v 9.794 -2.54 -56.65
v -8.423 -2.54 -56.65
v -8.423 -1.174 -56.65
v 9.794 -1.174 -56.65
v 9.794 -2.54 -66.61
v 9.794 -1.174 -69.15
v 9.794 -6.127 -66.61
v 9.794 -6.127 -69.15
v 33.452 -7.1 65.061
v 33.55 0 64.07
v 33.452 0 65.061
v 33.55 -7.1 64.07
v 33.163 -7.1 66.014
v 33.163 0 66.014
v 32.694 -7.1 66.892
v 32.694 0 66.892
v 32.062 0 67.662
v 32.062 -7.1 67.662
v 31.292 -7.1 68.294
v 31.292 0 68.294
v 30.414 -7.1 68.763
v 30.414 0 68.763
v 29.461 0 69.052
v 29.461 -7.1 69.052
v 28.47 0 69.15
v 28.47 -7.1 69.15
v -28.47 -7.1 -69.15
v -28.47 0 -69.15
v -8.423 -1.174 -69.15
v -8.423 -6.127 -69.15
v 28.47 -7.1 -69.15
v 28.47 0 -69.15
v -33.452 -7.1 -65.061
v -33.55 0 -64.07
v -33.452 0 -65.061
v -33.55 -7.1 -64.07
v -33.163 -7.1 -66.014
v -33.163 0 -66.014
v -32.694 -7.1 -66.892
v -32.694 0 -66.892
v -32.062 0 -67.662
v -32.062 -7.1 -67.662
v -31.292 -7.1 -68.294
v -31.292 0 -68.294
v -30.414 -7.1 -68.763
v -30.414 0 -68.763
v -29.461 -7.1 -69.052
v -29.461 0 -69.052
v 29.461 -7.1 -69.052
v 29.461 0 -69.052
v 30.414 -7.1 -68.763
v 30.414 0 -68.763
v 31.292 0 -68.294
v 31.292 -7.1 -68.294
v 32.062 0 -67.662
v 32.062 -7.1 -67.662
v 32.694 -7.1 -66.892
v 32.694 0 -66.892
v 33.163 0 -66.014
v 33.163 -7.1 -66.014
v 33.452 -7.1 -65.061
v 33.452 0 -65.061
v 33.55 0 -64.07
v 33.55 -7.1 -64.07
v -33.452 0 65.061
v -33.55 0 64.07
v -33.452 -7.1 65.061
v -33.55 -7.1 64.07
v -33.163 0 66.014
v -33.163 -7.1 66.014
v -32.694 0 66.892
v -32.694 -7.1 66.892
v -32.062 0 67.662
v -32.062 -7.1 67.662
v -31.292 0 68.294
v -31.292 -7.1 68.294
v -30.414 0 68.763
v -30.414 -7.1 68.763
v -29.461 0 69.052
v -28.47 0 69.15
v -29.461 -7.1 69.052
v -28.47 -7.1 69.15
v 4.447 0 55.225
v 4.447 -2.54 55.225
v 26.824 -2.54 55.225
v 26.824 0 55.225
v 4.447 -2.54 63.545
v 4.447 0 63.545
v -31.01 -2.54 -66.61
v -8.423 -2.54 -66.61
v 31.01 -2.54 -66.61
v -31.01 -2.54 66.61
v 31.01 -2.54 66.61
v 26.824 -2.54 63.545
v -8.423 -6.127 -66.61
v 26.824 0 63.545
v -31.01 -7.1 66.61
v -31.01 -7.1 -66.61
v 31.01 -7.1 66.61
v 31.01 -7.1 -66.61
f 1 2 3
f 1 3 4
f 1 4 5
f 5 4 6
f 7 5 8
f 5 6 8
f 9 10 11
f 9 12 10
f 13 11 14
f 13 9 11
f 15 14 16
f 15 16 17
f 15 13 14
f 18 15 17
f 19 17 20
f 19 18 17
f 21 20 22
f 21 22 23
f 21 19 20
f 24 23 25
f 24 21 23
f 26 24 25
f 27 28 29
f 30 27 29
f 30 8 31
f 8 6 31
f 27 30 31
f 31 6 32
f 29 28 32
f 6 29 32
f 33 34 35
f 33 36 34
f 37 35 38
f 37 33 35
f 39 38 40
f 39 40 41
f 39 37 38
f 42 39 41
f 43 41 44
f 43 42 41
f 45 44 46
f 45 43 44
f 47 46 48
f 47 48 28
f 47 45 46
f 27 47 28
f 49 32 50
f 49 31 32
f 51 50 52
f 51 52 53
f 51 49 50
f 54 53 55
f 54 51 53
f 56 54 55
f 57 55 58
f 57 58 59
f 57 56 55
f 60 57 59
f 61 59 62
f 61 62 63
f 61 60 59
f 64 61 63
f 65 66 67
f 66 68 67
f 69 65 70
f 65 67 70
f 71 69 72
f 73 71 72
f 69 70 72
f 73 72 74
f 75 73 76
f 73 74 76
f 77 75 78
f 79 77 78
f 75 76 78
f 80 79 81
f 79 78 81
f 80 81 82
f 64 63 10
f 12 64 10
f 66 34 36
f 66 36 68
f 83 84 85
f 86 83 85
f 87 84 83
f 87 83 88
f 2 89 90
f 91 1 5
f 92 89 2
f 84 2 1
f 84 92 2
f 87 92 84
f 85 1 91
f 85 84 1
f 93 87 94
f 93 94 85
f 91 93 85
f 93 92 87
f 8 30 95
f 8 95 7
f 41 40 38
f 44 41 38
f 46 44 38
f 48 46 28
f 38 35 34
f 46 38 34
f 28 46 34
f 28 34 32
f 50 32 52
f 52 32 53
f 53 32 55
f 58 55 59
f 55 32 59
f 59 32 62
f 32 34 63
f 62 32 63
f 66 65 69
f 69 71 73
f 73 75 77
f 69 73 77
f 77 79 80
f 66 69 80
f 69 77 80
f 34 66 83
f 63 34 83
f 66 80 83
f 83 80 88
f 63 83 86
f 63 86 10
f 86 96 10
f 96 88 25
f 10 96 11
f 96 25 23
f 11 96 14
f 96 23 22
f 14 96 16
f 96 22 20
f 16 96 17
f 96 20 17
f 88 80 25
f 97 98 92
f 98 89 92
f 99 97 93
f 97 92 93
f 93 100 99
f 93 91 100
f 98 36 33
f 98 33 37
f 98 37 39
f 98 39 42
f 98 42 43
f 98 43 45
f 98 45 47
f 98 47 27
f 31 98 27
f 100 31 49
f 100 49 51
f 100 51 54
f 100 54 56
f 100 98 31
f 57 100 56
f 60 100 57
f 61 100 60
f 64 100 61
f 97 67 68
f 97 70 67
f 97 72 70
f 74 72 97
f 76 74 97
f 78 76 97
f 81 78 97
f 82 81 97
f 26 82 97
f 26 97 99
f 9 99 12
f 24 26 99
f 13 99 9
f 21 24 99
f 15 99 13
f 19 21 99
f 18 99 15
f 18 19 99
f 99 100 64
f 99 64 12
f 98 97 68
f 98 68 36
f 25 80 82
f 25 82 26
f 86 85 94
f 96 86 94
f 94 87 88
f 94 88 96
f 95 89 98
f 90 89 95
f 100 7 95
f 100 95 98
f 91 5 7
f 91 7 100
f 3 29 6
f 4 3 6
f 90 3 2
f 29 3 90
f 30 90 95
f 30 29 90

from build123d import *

# Parameters (mm, degrees)
F0_W     = 67.1
F0_H     = 138.3
F1_DEPTH = 7.1
F2_T     = -2.54
F3_R     = 5.08
F5_W     = 18.216582
F5_H     = 4.952895
F6_DEPTH = 12.5
F4_W     = 22.377047
F4_H     = 8.319672
F7_DEPTH = 12.5


with BuildPart() as f1:
    # F0 (on Front) → F1 (new body)
    with BuildSketch(Plane.XZ):
        Rectangle(F0_W, F0_H)
    extrude(amount=F1_DEPTH)

    # F2
    f2_openings = [f1.faces().sort_by_distance(p)[0] for p in [
        (0, -7.1, 0),
    ]]
    offset(amount=F2_T, openings=f2_openings)

    # F3
    f3_edges = [f1.edges().sort_by_distance(p)[0] for p in [
        (33.55, -3.55, 69.15),
        (33.55, -3.55, -69.15),
        (-33.55, -3.55, 69.15),
        (-33.55, -3.55, -69.15),
    ]]
    fillet(f3_edges, radius=F3_R)

    # F5 (on face) → F6 (cut, symmetric)
    with BuildSketch(Plane(origin=(0, 0, -69.15), x_dir=(1, 0, 0), z_dir=(0, 0, -1))):
        with Locations((0.68537, 3.650227)):
            Rectangle(F5_W, F5_H)
    extrude(amount=F6_DEPTH, both=True, mode=Mode.SUBTRACT)

    # F4 (on face) → F7 (cut, symmetric)
    with BuildSketch(Plane.XZ.offset(2.54)):
        with Locations((15.635246, 59.385249)):
            Rectangle(F4_W, F4_H)
    extrude(amount=F7_DEPTH, both=True, mode=Mode.SUBTRACT)


solid = f1.part
